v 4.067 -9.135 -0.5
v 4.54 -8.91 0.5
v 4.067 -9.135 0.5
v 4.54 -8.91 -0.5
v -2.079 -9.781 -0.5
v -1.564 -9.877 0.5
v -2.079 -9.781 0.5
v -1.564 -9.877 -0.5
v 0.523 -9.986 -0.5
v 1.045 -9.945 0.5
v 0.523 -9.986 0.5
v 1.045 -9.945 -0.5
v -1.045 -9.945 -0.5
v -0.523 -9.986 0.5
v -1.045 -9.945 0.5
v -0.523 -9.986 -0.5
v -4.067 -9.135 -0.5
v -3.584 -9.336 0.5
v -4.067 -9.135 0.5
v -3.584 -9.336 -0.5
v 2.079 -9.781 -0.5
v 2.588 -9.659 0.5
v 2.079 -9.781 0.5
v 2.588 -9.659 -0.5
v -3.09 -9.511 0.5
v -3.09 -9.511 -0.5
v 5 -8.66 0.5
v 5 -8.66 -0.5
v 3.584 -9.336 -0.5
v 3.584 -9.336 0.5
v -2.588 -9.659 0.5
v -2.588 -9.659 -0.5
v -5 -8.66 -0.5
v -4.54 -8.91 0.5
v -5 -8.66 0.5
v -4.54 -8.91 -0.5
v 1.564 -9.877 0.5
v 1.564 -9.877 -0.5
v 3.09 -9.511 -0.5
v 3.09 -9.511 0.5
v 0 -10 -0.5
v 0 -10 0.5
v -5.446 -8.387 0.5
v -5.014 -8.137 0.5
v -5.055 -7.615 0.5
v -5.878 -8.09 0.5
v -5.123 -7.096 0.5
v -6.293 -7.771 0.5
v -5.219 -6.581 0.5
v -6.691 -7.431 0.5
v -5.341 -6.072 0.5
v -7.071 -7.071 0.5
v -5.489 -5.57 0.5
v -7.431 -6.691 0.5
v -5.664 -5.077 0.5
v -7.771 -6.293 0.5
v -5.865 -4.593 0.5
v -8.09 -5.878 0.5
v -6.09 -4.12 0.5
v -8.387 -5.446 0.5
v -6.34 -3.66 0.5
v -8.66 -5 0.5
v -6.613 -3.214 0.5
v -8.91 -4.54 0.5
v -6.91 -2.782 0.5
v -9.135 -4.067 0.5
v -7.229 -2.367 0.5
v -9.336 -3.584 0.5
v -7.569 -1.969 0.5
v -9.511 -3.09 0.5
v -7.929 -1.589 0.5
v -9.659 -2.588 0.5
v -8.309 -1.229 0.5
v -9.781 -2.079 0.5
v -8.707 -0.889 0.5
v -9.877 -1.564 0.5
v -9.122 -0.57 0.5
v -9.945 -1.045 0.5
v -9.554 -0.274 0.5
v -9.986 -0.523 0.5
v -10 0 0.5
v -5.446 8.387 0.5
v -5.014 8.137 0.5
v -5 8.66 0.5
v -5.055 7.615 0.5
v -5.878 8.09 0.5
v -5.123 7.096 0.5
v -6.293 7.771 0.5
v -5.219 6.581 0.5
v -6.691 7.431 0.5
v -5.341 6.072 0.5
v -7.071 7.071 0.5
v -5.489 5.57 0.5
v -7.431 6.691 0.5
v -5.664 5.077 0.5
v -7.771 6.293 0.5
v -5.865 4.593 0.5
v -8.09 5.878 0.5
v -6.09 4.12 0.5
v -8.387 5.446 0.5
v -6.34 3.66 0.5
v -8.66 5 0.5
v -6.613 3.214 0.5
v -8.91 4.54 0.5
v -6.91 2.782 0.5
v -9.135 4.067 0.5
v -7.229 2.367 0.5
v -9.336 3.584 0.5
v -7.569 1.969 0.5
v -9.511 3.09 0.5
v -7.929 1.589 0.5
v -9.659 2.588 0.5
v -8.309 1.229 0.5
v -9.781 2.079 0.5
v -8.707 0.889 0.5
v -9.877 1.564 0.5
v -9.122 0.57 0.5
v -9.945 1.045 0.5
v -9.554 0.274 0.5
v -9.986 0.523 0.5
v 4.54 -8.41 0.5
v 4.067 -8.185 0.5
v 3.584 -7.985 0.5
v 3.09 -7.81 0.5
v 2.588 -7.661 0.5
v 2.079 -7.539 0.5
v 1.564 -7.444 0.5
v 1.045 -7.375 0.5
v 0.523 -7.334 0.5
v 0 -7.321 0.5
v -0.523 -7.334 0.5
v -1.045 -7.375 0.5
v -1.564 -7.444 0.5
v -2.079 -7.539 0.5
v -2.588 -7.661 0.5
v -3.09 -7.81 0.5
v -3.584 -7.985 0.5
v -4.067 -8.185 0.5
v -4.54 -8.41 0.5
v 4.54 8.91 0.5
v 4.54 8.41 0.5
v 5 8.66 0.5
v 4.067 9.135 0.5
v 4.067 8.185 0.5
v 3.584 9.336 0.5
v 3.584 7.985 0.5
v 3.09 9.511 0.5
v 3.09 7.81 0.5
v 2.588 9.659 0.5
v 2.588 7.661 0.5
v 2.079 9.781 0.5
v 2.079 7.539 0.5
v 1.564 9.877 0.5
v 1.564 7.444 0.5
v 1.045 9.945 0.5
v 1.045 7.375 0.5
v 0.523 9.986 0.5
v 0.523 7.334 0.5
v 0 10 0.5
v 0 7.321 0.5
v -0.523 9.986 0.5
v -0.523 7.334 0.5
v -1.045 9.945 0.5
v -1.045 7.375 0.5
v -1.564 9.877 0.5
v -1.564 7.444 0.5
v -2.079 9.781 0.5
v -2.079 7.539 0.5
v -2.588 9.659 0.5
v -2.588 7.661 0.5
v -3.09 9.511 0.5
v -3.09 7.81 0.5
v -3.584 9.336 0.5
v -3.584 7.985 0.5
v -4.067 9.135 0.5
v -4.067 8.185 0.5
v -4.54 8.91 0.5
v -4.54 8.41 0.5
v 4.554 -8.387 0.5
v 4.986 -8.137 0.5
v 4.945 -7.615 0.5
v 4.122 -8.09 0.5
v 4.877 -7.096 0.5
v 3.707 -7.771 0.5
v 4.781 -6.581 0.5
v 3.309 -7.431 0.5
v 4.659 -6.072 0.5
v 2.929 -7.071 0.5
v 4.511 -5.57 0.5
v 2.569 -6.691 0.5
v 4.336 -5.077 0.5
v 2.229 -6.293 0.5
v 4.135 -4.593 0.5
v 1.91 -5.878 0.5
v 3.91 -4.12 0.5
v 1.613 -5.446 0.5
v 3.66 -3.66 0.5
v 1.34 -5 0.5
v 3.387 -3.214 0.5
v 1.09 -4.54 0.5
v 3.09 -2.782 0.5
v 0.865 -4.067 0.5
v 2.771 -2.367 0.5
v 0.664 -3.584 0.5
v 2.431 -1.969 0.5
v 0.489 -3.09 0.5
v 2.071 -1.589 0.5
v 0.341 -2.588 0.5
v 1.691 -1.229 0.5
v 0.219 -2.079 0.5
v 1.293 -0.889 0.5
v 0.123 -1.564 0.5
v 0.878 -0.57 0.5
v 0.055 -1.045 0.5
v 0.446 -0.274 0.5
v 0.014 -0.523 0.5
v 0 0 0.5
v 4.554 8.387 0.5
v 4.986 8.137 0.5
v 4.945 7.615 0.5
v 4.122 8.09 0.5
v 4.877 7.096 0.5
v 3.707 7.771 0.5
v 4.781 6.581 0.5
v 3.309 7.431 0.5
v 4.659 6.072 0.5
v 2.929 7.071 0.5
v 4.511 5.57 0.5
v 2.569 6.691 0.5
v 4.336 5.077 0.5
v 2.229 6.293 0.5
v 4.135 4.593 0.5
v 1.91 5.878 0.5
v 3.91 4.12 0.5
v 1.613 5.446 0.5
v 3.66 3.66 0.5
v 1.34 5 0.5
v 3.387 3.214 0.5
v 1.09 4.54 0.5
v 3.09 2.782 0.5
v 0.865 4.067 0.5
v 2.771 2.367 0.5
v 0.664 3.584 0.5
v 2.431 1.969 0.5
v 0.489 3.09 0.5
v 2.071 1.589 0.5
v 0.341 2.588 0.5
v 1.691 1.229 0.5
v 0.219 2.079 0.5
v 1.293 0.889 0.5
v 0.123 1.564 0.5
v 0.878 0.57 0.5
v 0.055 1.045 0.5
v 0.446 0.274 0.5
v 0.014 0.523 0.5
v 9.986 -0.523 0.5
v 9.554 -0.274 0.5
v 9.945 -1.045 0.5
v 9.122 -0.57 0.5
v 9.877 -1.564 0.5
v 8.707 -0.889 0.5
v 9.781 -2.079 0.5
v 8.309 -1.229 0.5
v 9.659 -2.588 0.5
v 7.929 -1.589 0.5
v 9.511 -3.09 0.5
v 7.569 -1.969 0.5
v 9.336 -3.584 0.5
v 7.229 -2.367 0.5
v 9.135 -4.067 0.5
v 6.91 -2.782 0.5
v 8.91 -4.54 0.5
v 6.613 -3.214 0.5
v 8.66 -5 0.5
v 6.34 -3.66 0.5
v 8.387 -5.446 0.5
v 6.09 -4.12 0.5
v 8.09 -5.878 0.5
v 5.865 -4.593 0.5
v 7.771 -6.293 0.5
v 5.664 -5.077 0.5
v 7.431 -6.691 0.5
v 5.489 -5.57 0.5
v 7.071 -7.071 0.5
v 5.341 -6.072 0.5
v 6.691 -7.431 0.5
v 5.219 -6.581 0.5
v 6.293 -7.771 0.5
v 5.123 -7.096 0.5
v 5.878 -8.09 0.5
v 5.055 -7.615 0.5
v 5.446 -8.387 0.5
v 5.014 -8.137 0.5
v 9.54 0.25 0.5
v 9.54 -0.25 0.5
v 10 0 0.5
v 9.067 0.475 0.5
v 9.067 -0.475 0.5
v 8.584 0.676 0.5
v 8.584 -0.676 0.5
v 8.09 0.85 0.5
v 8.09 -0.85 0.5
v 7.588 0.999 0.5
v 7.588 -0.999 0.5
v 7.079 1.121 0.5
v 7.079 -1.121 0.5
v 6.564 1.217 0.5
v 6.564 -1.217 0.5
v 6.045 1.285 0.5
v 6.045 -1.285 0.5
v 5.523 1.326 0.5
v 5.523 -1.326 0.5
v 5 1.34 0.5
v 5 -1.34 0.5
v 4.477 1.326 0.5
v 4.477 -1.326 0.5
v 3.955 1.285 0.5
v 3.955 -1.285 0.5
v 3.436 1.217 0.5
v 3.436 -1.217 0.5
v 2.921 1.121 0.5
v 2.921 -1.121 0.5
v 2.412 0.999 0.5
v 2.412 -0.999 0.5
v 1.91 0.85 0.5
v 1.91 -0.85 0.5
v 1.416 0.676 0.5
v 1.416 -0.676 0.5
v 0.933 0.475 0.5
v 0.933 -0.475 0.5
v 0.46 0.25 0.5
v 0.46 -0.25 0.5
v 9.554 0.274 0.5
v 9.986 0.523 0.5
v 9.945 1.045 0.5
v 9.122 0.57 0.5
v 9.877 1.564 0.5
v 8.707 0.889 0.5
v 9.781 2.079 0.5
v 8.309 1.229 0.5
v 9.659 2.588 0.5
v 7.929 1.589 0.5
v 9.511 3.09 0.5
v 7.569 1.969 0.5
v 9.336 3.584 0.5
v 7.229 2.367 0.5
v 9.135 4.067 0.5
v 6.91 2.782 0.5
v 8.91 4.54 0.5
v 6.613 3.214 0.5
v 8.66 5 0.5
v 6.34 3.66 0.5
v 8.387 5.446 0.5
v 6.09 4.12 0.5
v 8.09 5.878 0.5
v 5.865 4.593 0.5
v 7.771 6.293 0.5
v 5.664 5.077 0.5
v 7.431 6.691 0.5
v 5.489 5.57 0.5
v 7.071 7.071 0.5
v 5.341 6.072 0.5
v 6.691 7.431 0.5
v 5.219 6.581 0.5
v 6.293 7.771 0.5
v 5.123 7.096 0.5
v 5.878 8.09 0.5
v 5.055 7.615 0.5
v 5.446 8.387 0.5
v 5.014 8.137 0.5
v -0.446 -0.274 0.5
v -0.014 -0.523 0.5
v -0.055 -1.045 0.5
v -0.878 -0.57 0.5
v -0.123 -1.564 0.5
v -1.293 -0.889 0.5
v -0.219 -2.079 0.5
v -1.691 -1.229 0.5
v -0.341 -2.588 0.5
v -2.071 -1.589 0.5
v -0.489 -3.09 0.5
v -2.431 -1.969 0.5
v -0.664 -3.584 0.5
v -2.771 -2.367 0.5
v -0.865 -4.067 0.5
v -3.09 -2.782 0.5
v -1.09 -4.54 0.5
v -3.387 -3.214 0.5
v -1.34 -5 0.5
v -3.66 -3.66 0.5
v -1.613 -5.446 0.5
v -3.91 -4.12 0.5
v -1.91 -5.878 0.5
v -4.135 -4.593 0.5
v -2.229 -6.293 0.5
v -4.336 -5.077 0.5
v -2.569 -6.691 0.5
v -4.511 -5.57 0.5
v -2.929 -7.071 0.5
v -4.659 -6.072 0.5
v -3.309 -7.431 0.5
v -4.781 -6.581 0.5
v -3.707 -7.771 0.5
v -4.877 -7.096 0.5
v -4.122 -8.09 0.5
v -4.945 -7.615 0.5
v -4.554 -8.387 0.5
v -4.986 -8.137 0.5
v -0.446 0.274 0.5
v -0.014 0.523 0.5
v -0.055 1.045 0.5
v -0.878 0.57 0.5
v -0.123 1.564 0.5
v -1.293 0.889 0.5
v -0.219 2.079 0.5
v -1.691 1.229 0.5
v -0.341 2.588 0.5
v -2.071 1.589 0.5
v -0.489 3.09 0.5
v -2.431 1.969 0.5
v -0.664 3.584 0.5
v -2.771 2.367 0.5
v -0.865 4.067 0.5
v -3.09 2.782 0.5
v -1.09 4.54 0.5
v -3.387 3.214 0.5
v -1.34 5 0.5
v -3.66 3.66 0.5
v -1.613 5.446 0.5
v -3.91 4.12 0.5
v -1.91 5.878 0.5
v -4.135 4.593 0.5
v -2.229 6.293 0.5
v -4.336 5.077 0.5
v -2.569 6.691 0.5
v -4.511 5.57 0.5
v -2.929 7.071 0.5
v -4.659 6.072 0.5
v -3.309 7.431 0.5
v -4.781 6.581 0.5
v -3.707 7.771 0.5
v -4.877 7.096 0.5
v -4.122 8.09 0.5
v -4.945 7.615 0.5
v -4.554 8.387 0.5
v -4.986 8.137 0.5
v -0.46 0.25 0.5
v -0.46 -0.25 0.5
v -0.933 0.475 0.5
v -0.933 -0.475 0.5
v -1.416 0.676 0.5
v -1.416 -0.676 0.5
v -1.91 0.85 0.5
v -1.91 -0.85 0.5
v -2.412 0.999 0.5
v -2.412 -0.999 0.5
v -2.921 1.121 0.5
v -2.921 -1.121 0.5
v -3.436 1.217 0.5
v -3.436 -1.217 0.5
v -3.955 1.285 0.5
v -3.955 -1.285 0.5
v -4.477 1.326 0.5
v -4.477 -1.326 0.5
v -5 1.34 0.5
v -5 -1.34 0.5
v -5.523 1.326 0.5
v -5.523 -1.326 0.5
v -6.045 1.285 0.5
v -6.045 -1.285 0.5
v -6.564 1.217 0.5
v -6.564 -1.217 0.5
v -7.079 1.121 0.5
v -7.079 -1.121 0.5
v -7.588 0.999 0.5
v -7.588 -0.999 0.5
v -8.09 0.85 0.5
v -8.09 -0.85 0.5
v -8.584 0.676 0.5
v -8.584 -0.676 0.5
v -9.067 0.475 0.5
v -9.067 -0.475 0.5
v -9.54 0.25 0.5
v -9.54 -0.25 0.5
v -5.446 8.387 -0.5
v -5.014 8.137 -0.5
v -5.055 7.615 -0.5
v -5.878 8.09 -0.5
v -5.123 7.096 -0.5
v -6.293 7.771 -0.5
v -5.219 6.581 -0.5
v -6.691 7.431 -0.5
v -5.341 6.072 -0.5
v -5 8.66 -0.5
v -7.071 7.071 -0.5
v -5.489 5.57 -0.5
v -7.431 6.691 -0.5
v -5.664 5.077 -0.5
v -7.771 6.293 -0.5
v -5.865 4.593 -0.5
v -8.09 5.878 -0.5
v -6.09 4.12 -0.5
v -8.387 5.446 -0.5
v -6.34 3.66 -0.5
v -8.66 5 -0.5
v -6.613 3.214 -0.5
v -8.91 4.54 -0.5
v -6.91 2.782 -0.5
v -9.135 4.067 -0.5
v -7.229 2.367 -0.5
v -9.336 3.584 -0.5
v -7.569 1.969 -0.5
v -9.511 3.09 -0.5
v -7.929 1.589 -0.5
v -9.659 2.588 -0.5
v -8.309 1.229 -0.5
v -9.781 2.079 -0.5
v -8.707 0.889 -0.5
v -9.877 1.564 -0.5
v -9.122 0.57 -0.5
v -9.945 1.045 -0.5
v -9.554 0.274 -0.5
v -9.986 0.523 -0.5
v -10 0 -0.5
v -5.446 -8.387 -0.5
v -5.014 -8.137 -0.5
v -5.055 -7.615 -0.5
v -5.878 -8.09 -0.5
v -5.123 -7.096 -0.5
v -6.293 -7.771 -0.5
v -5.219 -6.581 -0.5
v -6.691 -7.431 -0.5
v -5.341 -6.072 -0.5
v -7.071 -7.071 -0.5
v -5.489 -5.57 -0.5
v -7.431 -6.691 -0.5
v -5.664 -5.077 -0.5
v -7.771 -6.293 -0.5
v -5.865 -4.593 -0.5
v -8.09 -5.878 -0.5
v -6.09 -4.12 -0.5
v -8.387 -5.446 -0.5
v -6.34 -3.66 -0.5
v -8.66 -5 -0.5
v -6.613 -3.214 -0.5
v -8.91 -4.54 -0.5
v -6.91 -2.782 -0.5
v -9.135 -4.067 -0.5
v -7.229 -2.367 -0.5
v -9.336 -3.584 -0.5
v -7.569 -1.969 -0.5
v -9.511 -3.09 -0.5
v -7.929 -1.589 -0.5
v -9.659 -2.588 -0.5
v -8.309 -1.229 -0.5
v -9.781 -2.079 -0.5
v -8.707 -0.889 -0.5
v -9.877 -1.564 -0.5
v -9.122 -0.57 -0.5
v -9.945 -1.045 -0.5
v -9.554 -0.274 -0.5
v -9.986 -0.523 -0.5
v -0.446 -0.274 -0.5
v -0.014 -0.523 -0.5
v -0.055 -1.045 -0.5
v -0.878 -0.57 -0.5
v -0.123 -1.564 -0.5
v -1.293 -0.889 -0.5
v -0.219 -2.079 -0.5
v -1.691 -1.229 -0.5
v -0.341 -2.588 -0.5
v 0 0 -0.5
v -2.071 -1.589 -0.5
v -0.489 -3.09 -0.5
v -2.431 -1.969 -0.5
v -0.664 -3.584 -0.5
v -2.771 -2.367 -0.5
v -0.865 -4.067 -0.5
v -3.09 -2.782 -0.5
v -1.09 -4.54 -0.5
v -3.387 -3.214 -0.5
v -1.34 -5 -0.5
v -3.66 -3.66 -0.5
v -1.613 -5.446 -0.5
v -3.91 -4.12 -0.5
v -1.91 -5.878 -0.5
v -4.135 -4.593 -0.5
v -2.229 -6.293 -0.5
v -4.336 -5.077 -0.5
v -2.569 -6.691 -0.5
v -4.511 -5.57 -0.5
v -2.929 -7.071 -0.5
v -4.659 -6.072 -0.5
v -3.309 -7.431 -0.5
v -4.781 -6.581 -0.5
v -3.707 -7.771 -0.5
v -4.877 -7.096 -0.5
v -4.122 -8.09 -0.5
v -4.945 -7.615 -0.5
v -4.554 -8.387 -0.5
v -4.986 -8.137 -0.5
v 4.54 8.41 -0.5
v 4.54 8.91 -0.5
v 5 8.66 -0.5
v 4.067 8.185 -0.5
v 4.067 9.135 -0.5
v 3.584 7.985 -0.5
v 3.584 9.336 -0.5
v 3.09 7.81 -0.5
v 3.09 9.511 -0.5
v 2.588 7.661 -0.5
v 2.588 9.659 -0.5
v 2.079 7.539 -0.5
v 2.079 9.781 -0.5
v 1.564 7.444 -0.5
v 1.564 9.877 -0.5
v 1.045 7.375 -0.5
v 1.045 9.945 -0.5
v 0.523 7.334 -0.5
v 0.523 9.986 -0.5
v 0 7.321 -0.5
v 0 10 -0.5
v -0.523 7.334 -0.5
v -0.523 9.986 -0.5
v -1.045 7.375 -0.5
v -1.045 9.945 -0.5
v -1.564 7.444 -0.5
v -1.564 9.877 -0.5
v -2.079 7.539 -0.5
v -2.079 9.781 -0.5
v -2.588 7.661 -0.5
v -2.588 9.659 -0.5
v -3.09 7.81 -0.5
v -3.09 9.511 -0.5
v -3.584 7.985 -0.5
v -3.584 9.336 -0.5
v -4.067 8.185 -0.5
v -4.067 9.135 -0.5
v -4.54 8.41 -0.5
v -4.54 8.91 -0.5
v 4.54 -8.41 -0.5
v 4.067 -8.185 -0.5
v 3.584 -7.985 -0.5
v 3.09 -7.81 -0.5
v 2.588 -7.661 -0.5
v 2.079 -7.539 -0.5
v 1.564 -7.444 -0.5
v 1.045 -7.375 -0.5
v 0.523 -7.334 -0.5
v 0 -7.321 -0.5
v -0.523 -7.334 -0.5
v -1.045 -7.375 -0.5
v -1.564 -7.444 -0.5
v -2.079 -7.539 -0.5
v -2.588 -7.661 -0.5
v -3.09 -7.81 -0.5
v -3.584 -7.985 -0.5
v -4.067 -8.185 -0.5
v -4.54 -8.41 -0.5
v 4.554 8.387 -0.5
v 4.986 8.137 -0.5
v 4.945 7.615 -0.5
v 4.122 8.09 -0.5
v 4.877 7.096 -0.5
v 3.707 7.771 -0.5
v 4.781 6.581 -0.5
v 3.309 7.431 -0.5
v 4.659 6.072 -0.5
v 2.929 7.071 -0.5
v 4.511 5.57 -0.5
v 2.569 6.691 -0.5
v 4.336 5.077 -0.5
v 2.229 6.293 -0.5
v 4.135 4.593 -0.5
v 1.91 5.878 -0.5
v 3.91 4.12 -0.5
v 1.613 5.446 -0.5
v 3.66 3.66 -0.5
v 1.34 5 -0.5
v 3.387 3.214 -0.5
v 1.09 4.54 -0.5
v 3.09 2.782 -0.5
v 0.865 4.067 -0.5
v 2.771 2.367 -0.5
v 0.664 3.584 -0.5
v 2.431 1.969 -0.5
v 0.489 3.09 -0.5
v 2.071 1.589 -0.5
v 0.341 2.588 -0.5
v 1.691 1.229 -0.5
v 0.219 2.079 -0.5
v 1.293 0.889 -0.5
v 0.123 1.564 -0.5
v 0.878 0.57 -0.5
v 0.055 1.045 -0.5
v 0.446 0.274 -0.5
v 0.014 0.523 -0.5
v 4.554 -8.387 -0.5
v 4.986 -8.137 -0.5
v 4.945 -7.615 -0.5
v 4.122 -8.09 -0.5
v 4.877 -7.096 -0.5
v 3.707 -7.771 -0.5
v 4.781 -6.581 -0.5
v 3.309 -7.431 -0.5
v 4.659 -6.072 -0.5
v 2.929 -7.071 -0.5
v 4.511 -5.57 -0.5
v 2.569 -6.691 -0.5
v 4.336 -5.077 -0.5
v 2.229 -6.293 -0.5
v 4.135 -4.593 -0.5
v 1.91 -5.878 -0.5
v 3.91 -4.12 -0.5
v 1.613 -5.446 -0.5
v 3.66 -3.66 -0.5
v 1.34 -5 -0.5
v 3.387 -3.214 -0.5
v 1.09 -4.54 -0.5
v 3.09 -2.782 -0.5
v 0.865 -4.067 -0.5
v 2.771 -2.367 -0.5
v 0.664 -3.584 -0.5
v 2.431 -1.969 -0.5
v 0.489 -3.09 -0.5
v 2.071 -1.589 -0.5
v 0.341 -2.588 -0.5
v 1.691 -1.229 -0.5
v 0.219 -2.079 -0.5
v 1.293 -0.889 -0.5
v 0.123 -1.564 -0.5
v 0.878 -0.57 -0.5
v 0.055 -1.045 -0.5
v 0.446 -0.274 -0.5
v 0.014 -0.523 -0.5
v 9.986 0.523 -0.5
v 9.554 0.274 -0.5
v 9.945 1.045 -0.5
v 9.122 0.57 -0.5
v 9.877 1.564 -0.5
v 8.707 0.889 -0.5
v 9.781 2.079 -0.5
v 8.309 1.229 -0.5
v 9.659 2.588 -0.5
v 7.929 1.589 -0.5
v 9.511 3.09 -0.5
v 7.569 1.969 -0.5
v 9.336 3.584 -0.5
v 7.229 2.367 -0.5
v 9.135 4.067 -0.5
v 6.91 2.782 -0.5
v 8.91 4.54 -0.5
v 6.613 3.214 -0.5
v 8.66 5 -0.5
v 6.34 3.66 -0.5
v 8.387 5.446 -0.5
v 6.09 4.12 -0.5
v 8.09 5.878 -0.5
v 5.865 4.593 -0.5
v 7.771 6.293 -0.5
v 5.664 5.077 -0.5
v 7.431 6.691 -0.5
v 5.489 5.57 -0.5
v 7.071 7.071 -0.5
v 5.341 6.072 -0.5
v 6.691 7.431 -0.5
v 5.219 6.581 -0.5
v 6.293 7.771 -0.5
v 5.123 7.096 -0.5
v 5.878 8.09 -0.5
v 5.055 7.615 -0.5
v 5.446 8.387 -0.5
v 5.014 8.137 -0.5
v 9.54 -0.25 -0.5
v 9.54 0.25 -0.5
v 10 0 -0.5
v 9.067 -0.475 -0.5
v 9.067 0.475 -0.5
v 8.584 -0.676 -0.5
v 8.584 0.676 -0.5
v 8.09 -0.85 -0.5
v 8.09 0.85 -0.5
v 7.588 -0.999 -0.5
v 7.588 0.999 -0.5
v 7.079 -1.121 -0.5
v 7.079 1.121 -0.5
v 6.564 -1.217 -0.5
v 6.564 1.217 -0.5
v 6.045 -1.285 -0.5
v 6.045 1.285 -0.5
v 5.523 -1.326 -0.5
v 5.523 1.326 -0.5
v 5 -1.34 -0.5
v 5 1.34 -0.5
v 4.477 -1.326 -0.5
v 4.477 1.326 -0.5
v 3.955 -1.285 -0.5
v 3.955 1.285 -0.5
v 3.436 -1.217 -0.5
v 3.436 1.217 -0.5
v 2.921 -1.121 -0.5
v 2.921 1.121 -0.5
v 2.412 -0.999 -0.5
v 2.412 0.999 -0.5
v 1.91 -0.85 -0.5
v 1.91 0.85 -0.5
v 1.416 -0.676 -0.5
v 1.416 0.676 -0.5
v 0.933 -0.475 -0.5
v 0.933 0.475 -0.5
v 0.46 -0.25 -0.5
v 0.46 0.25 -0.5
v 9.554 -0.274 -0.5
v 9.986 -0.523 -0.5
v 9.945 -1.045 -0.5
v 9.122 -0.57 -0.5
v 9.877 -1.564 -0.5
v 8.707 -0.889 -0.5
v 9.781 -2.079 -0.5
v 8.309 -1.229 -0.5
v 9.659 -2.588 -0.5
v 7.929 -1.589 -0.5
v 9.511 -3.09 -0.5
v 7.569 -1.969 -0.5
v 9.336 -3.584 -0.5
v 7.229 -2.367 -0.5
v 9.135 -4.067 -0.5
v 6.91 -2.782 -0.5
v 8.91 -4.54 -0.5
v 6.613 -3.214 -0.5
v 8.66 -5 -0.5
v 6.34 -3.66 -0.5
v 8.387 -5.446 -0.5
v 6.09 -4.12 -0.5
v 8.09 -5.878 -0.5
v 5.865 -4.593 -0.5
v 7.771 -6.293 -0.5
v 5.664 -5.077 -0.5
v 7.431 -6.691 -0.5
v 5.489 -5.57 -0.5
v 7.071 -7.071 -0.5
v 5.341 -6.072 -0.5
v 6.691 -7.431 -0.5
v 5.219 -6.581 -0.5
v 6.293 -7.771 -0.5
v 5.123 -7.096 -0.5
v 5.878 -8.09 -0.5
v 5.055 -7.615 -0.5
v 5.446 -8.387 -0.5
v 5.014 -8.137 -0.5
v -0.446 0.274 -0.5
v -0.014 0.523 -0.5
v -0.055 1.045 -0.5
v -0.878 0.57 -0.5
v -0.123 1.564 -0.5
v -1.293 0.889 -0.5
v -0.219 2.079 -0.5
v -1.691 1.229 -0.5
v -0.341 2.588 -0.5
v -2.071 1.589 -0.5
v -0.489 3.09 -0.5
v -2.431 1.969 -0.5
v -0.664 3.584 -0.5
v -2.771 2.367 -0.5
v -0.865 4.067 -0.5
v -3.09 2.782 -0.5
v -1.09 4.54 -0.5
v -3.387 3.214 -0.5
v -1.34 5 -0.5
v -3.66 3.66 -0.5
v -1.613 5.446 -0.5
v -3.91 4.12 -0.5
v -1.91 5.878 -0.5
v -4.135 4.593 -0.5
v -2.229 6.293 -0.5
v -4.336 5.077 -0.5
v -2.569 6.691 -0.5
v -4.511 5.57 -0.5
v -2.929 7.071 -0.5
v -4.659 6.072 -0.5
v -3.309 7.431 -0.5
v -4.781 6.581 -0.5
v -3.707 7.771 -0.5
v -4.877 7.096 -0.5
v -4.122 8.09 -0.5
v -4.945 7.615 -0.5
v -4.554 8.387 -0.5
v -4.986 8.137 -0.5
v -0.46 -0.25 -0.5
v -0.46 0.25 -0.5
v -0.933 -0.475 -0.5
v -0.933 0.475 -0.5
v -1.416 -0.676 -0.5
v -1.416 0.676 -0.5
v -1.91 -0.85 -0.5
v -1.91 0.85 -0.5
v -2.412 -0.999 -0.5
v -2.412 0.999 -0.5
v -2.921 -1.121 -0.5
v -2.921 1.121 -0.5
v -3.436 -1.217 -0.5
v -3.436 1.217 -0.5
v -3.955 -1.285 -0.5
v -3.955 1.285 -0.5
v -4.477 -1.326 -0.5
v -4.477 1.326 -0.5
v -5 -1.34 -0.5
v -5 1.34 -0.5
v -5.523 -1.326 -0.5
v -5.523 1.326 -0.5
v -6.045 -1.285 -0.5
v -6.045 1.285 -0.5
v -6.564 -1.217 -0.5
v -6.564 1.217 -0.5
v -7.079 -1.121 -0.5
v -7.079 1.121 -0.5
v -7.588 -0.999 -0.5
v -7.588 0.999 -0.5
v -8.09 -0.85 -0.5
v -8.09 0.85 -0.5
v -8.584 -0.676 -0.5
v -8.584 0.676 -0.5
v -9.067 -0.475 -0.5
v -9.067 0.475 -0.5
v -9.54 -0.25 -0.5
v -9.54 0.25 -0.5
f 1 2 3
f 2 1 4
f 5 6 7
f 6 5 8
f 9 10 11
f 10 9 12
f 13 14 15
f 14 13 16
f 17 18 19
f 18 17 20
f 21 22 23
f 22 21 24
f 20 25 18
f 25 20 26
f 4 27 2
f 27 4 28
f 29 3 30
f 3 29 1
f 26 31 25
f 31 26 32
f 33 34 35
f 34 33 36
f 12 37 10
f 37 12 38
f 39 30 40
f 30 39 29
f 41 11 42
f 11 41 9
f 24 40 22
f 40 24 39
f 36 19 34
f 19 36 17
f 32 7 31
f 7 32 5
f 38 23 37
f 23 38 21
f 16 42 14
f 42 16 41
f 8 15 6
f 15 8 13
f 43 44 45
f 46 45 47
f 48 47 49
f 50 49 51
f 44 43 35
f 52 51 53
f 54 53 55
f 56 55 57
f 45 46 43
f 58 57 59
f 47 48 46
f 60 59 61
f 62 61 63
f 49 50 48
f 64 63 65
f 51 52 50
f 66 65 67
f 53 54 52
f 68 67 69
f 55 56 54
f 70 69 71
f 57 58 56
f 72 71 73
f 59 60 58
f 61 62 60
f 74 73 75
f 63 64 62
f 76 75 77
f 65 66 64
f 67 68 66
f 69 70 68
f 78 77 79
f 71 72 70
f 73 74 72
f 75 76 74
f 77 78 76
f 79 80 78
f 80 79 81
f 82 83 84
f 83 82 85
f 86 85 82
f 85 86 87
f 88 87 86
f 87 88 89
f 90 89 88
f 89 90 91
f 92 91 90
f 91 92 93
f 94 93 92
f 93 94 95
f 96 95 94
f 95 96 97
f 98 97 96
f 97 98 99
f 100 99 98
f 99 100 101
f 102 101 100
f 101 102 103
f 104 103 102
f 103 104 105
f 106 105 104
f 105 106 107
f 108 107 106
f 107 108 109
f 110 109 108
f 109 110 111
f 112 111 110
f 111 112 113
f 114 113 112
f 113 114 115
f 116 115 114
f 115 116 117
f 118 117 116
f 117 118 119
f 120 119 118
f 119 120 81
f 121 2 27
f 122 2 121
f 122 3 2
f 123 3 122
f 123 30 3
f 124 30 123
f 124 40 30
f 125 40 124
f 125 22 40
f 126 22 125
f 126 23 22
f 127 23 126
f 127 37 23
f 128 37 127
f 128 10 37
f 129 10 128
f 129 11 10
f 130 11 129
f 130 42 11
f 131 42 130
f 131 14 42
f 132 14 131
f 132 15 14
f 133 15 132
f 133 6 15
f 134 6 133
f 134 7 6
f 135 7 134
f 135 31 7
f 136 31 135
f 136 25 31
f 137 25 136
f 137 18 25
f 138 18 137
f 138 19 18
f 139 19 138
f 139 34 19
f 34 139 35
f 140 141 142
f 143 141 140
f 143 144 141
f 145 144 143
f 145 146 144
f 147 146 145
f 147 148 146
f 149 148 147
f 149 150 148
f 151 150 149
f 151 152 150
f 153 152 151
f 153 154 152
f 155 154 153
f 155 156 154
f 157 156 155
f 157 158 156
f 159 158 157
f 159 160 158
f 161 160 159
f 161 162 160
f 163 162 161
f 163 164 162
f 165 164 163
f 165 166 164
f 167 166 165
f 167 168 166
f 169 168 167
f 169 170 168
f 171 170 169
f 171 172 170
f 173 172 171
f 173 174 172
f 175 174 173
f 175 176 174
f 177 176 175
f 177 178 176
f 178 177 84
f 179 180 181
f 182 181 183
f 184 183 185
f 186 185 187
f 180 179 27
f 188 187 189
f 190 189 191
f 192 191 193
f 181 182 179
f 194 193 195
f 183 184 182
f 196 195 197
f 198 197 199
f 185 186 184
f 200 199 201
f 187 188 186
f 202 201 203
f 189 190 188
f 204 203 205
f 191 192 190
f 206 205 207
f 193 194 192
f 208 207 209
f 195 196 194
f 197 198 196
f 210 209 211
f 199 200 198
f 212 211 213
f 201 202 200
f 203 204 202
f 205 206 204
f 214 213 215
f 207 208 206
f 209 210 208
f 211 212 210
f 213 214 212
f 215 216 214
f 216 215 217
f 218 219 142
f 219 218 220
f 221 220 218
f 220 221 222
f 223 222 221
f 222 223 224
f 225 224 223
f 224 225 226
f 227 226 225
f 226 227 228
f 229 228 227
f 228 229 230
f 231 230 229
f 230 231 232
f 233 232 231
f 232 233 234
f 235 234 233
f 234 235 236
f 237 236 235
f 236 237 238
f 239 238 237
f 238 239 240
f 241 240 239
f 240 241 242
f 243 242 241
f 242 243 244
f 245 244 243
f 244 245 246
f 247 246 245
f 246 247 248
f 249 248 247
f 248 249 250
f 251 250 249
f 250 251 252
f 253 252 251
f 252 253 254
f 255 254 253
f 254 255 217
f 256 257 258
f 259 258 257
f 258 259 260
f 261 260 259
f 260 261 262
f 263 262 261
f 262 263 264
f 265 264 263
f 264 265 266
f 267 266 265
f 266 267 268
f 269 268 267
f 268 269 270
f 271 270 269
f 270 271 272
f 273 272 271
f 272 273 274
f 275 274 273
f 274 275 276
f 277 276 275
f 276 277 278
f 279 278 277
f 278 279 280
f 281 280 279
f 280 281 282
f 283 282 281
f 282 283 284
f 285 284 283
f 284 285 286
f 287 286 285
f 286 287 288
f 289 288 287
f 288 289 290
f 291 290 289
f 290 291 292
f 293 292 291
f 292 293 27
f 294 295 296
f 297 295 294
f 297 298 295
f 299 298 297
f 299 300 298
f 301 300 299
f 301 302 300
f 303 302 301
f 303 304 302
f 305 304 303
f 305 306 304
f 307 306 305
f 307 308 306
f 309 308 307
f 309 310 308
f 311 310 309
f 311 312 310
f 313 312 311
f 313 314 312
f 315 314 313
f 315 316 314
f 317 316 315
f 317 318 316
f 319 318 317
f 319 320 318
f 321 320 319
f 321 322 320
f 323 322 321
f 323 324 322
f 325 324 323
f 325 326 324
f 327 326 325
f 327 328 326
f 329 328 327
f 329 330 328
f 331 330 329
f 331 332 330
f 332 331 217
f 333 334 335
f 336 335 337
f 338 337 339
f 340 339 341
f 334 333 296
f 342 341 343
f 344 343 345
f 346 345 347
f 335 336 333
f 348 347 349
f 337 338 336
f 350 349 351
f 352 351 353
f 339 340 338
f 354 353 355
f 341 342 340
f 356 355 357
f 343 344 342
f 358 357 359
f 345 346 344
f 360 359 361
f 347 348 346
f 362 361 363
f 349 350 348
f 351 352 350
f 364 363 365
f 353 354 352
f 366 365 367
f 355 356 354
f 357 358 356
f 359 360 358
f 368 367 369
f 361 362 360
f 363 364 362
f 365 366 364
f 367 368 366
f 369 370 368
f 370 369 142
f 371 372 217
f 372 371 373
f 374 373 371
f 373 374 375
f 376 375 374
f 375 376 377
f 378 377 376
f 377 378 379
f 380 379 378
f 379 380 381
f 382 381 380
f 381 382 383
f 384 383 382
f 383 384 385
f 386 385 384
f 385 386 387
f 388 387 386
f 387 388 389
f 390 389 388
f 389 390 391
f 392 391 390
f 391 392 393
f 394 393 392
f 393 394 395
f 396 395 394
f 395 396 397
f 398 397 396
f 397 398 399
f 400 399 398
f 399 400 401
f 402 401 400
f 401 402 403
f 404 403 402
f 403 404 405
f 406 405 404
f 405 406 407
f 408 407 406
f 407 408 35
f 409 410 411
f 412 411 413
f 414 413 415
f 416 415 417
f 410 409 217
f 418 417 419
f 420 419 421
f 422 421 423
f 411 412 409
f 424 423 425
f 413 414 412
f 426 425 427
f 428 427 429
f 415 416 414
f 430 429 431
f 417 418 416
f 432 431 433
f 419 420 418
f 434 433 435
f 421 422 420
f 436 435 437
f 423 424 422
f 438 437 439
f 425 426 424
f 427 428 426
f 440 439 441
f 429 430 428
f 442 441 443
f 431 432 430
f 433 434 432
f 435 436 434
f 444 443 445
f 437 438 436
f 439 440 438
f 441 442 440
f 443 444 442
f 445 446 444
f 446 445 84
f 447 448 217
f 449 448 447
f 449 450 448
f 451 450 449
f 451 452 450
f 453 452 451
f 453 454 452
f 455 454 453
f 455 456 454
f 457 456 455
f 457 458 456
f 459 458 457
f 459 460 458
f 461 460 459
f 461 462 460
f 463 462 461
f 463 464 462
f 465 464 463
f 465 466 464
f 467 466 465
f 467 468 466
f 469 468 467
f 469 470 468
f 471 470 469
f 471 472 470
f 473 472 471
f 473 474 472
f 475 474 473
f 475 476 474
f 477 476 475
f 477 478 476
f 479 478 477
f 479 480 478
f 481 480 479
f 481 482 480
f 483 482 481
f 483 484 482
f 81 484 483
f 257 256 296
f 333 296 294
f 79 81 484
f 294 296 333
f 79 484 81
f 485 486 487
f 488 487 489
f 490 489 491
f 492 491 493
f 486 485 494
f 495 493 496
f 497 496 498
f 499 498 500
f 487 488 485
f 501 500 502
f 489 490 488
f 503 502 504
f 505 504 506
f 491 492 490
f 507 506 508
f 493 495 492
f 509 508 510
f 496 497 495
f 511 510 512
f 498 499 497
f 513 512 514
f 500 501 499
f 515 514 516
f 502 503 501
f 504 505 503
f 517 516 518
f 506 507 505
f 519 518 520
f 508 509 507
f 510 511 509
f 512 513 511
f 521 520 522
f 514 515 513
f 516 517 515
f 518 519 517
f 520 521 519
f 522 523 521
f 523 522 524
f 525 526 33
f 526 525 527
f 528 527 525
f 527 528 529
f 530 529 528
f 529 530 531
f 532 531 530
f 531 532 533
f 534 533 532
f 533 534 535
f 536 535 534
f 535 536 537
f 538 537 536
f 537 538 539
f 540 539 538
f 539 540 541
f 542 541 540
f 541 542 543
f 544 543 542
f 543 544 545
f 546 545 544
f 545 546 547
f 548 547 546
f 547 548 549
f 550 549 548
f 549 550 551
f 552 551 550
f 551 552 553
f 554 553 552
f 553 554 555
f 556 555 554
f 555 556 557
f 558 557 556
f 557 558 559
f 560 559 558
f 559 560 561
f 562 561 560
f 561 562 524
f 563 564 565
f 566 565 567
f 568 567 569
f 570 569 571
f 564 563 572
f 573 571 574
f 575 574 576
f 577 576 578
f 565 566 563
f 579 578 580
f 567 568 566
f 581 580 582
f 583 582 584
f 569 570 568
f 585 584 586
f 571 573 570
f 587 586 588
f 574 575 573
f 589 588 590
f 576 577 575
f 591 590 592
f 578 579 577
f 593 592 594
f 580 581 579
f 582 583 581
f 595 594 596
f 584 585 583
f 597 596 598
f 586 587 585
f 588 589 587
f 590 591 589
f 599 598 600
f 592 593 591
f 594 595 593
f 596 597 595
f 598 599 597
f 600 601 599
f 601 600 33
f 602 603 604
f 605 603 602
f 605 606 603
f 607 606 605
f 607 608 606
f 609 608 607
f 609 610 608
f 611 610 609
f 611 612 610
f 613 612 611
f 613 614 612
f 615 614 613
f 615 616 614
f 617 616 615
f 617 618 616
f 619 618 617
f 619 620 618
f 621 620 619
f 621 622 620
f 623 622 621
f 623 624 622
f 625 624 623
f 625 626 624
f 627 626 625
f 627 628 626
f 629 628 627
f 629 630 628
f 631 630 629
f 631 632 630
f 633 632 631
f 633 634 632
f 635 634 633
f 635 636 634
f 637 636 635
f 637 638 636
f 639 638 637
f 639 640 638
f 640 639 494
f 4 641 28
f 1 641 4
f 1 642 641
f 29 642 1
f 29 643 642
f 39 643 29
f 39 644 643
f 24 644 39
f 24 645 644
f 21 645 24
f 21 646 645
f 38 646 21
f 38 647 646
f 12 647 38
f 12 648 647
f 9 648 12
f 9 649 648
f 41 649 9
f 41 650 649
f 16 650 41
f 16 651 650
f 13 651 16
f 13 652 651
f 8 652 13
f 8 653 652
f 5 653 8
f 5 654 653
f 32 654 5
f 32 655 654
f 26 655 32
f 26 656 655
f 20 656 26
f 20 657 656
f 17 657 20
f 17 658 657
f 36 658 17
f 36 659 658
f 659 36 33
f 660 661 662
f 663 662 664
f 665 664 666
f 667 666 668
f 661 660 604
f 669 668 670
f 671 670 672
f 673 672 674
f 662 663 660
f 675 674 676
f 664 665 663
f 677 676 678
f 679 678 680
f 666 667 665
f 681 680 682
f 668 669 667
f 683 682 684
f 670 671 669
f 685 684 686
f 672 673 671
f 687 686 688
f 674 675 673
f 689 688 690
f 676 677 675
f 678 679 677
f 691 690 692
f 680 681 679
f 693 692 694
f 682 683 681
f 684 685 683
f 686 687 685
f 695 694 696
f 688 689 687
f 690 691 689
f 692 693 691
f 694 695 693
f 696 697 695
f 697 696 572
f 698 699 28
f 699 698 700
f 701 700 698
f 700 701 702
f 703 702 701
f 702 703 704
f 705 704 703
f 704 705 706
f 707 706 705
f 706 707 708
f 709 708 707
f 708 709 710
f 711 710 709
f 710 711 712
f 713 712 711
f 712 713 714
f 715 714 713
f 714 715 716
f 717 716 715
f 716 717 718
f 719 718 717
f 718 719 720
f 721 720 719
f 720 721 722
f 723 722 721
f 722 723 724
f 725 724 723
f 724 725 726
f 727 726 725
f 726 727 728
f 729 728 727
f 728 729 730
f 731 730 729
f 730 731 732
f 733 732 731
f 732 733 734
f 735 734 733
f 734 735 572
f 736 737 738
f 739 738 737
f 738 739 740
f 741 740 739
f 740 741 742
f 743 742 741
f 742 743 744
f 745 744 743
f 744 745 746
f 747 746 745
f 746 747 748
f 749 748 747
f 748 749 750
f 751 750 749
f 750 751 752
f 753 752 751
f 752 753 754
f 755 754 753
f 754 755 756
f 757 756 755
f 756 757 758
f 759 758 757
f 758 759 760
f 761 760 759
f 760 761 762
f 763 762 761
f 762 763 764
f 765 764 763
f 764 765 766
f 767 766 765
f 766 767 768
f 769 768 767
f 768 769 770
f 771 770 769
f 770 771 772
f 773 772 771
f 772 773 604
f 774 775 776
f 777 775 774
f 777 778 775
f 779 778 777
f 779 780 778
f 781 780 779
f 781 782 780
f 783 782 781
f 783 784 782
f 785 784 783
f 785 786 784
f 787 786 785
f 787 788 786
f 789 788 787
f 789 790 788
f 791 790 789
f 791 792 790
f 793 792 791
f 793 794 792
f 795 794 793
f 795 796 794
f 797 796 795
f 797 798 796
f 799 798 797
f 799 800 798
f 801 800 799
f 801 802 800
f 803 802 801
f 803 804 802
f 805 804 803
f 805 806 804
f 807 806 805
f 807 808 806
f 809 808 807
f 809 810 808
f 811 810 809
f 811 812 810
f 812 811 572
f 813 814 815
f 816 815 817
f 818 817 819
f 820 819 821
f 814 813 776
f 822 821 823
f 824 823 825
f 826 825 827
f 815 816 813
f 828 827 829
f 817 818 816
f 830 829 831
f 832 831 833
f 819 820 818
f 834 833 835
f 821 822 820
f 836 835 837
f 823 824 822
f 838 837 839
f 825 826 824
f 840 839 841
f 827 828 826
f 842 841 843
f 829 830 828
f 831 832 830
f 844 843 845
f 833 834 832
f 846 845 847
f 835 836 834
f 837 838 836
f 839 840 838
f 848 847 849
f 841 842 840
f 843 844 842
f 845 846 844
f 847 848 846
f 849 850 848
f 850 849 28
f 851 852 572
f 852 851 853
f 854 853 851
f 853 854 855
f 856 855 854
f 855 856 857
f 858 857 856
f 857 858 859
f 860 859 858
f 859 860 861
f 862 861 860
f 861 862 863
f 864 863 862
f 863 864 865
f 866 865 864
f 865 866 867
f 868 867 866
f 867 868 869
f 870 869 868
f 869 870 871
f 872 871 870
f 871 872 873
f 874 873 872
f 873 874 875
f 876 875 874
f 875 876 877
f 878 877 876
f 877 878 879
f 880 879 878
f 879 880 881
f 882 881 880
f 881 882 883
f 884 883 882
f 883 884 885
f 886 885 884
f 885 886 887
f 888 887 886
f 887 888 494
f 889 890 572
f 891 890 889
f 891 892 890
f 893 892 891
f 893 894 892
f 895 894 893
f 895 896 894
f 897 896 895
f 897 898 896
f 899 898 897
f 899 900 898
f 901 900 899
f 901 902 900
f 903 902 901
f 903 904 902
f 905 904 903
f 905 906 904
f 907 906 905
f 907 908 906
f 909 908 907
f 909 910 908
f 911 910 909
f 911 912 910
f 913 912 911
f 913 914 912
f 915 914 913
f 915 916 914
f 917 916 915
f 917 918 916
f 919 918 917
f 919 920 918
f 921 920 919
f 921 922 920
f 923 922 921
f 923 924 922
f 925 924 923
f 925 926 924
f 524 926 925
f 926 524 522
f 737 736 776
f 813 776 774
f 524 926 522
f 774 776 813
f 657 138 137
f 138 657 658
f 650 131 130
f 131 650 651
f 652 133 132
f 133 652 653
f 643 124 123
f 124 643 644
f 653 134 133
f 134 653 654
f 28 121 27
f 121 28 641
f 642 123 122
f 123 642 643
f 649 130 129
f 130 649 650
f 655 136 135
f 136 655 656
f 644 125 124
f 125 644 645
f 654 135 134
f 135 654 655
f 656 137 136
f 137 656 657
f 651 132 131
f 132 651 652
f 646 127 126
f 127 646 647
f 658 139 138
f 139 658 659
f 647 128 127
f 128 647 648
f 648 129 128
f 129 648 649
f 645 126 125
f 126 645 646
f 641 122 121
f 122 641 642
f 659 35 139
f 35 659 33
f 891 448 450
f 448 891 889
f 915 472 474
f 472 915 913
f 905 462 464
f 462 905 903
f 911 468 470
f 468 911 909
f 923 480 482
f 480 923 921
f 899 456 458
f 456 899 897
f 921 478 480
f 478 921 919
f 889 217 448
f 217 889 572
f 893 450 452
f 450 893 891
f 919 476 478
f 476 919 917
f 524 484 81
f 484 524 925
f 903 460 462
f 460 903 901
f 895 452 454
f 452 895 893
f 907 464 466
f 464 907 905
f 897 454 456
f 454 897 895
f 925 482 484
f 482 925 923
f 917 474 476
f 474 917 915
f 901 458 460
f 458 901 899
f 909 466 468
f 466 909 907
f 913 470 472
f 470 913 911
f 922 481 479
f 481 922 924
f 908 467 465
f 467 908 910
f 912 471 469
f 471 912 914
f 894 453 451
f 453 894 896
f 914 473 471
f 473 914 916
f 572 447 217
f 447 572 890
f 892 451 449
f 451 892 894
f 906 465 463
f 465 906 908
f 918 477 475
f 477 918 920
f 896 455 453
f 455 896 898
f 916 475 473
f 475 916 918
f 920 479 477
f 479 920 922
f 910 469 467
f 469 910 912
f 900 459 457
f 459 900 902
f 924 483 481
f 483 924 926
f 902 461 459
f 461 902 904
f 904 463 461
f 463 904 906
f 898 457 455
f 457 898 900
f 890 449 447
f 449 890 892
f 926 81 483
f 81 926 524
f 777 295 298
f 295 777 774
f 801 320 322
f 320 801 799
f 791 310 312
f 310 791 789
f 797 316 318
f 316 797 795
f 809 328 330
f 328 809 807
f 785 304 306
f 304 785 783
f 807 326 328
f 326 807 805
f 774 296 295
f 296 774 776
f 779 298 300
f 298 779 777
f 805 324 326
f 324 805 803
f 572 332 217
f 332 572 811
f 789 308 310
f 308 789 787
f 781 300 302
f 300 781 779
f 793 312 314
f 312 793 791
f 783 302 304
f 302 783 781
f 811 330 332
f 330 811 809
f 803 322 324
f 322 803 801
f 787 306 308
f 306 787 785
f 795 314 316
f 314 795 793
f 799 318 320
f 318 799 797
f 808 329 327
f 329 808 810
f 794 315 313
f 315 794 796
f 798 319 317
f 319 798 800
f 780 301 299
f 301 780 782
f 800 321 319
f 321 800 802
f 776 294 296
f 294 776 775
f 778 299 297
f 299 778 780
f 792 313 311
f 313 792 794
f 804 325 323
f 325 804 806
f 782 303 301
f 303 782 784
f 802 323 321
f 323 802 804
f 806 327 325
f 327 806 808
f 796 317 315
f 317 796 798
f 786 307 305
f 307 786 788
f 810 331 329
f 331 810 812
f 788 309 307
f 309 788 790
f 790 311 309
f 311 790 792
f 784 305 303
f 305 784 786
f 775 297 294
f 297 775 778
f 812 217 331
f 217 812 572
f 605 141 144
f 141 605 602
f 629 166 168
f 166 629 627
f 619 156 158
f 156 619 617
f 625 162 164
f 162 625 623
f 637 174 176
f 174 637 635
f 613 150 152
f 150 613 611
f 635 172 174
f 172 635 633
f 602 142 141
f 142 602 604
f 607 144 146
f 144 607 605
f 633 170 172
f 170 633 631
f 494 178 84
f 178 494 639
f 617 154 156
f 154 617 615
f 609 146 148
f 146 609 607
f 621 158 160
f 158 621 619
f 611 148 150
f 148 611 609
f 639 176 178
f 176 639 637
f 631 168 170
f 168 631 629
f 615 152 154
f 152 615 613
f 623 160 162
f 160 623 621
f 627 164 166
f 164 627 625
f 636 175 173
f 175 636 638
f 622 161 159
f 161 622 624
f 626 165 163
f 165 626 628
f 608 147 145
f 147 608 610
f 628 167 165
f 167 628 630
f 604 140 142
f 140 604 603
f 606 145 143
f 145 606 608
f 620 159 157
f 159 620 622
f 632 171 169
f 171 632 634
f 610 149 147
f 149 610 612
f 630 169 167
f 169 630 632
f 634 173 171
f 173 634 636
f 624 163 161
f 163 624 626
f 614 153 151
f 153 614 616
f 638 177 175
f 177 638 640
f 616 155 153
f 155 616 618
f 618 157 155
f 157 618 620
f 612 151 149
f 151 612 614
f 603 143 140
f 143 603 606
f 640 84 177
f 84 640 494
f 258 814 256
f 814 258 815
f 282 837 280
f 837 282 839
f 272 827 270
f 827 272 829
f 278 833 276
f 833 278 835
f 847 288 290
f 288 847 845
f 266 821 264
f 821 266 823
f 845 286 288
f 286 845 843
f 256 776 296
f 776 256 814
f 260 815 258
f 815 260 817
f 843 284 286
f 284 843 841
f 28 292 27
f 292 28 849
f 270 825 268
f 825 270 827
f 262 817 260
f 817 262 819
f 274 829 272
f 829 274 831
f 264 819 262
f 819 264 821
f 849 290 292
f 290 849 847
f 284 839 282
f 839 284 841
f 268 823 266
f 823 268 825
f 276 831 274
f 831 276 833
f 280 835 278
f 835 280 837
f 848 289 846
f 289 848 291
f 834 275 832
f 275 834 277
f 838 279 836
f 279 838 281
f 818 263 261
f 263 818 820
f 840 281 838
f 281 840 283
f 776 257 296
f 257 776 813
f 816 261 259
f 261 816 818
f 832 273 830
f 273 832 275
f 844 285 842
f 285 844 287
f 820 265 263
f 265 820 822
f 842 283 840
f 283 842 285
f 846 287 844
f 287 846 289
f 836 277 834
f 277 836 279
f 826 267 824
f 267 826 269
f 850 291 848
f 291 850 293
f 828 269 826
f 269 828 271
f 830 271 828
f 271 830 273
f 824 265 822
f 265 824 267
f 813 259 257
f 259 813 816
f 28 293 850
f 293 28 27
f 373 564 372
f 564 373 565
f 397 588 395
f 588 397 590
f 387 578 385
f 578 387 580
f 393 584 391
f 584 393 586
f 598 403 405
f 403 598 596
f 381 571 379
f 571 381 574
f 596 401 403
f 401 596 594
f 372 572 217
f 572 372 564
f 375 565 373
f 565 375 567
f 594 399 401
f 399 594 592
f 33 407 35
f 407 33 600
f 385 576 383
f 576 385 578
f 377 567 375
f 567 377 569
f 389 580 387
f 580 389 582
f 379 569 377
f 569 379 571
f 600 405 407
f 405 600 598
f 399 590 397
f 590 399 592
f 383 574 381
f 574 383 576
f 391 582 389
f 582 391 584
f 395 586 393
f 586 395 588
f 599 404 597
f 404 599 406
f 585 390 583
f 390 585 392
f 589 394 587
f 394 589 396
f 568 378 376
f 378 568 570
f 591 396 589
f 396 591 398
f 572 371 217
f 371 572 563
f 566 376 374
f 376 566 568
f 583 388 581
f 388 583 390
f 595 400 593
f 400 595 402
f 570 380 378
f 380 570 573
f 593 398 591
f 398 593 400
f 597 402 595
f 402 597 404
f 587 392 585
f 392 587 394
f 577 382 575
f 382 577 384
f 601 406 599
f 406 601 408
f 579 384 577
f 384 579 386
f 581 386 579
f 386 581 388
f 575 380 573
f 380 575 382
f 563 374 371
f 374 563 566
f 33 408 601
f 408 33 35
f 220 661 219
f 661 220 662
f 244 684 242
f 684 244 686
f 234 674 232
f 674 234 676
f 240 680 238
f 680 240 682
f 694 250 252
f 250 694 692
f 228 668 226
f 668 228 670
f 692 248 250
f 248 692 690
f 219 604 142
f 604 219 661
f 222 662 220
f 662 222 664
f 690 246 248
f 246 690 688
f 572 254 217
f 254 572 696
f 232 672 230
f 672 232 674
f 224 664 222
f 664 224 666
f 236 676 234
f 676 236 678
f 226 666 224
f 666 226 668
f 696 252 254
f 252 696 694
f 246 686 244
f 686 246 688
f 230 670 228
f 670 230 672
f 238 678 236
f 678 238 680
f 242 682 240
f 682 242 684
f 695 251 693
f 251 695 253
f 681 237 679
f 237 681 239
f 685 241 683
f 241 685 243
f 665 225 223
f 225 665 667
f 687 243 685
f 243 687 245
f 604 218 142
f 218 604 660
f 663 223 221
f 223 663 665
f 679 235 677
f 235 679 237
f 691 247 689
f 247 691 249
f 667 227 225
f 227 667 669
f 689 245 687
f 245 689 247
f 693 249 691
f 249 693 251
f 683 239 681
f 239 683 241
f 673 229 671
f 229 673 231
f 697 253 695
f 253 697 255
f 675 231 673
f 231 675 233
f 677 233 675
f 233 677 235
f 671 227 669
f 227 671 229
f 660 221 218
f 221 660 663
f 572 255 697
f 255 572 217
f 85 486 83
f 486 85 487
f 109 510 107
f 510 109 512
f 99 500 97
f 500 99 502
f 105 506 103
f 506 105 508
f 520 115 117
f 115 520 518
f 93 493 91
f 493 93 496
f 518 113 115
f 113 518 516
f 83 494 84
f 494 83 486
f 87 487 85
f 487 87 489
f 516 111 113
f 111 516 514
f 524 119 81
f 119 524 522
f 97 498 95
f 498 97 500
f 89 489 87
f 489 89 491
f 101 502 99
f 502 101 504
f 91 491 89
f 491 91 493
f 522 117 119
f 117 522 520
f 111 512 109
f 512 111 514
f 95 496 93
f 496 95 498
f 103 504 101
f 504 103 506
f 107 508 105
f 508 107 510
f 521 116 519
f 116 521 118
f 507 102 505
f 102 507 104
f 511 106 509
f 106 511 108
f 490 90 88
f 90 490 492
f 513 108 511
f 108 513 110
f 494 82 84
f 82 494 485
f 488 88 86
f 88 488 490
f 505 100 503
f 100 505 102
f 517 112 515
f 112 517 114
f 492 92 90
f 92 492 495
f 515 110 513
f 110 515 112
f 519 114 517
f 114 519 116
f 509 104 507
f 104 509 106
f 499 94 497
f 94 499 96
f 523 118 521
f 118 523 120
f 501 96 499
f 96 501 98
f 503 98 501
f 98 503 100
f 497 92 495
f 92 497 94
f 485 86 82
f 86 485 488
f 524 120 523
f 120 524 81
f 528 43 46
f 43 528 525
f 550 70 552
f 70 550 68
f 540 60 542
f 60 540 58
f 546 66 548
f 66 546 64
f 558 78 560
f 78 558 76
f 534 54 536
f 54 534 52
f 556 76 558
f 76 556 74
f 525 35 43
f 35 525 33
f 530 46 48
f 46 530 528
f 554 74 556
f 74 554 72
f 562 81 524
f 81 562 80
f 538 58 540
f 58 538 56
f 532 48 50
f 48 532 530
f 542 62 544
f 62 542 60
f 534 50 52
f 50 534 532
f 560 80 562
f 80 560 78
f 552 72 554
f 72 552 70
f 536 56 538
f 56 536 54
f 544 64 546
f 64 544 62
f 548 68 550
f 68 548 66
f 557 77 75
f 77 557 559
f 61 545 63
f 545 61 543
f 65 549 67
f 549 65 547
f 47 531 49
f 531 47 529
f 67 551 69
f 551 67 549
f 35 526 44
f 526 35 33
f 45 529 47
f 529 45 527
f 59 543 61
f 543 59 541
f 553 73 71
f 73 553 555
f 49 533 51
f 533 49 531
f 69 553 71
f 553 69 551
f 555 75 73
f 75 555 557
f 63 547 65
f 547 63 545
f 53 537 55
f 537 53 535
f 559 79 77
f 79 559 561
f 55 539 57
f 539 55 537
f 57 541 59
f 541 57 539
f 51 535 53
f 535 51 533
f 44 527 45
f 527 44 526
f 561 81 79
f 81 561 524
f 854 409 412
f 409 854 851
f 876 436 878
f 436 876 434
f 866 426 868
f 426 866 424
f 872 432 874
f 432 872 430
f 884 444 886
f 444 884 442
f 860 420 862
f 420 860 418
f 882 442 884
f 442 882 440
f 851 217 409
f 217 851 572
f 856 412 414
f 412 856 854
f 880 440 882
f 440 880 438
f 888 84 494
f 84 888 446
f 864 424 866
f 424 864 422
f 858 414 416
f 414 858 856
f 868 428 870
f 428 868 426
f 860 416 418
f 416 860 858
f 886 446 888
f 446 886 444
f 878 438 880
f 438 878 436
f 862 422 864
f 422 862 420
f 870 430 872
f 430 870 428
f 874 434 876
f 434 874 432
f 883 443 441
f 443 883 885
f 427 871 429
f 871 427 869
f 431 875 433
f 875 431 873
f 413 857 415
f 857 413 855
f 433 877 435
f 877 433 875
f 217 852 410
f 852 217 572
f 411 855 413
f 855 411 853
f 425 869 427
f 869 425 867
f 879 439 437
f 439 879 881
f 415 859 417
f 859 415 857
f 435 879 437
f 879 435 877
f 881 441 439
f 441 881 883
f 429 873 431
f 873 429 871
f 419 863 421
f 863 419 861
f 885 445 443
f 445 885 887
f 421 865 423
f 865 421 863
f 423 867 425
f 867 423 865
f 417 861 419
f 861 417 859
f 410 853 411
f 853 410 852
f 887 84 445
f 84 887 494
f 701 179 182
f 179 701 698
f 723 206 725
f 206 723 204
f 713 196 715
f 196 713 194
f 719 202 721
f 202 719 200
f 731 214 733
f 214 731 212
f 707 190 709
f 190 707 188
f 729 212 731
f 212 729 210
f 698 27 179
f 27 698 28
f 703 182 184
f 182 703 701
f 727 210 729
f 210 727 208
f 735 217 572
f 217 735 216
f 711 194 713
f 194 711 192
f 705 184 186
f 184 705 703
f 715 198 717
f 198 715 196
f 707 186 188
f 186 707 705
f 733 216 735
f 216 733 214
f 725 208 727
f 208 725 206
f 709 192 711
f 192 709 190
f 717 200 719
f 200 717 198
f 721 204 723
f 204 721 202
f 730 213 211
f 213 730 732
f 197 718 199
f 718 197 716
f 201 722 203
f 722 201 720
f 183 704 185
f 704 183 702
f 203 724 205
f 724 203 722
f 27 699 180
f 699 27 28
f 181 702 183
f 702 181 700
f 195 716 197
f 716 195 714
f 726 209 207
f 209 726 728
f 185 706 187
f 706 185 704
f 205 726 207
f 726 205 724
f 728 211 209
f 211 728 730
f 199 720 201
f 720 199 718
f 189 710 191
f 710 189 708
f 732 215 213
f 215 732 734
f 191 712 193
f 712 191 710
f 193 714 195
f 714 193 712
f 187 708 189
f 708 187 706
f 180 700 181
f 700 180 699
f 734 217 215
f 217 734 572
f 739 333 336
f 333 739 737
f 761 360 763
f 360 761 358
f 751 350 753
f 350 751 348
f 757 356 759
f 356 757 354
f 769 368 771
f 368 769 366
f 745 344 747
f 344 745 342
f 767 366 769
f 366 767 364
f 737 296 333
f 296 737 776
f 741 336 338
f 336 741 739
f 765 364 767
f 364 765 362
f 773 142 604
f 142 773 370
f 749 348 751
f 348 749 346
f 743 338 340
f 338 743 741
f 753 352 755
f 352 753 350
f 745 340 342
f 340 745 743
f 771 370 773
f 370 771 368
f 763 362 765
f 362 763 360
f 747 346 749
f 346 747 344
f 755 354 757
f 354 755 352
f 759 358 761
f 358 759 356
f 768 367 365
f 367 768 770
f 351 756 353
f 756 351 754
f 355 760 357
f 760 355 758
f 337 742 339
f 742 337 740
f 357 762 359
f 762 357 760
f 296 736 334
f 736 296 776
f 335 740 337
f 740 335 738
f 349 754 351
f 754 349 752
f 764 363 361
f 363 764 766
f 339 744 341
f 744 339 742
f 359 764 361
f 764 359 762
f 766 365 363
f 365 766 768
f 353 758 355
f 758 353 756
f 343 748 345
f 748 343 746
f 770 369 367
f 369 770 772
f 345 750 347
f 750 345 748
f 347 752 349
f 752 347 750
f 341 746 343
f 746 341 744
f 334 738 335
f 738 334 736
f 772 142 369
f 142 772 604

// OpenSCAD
/* * * * * * * * * * * * * * * * * * * * * * * * * * * * * * * * * * * * *\
 * Copyright (C) Claus Schrammel <claus@f05fk.net>                       *
 *                                                                       *
 * This program is free software: you can redistribute it and/or modify  *
 * it under the terms of the GNU General Public License as published by  *
 * the Free Software Foundation, either version 3 of the License, or     *
 * (at your option) any later version.                                   *
 *                                                                       *
 * This program is distributed in the hope that it will be useful,       *
 * but WITHOUT ANY WARRANTY; without even the implied warranty of        *
 * MERCHANTABILITY or FITNESS FOR A PARTICULAR PURPOSE.  See the         *
 * GNU General Public License for more details.                          *
 *                                                                       *
 * You should have received a copy of the GNU General Public License     *
 * along with this program.  If not, see <http://www.gnu.org/licenses/>. *
 *                                                                       *
 * SPDX-License-Identifier: GPL-3.0-or-later                             *
\* * * * * * * * * * * * * * * * * * * * * * * * * * * * * * * * * * * * */
$fn = 120;

$height = 1;
$length = 10;
$cross = $length * sqrt(3) / 2;

axis();
rotate( 60) axis();
rotate(-60) axis();

module axis() {
*    translate([-1.0 * $length, -3 * $cross, 0]) arc();
*    translate([ 0.0 * $length, -3 * $cross, 0]) arc();
*    translate([ 1.0 * $length, -3 * $cross, 0]) arc();

*    translate([-1.5 * $length, -2 * $cross, 0]) arc();
*    translate([-0.5 * $length, -2 * $cross, 0]) arc();
*    translate([ 0.5 * $length, -2 * $cross, 0]) arc();
*    translate([ 1.5 * $length, -2 * $cross, 0]) arc();

*    translate([-2.0 * $length, -1 * $cross, 0]) arc();
*    translate([-1.0 * $length, -1 * $cross, 0]) arc();
    translate([ 0.0 * $length, -1 * $cross, 0]) arc();
*    translate([ 1.0 * $length, -1 * $cross, 0]) arc();
*    translate([ 2.0 * $length, -1 * $cross, 0]) arc();

*    translate([-2.5 * $length,  0 * $cross, 0]) arc();
*    translate([-1.5 * $length,  0 * $cross, 0]) arc();
    translate([-0.5 * $length,  0 * $cross, 0]) arc();
    translate([ 0.5 * $length,  0 * $cross, 0]) arc();
*    translate([ 1.5 * $length,  0 * $cross, 0]) arc();
*    translate([ 2.5 * $length,  0 * $cross, 0]) arc();

*    translate([-2.0 * $length,  1 * $cross, 0]) arc();
*    translate([-1.0 * $length,  1 * $cross, 0]) arc();
    translate([ 0.0 * $length,  1 * $cross, 0]) arc();
*    translate([ 1.0 * $length,  1 * $cross, 0]) arc();
*    translate([ 2.0 * $length,  1 * $cross, 0]) arc();

*    translate([-1.5 * $length,  2 * $cross, 0]) arc();
*    translate([-0.5 * $length,  2 * $cross, 0]) arc();
*    translate([ 0.5 * $length,  2 * $cross, 0]) arc();
*    translate([ 1.5 * $length,  2 * $cross, 0]) arc();

*    translate([-1.0 * $length,  3 * $cross, 0]) arc();
*    translate([ 0.0 * $length,  3 * $cross, 0]) arc();
*    translate([ 1.0 * $length,  3 * $cross, 0]) arc();
}

module arc() {
    intersection() {
        translate([0, $cross, 0])
        cylinder(h = $height, r = $length, center = true);
        translate([0, -$cross, 0])
        cylinder(h = $height, r = $length, center = true);
    }
}
